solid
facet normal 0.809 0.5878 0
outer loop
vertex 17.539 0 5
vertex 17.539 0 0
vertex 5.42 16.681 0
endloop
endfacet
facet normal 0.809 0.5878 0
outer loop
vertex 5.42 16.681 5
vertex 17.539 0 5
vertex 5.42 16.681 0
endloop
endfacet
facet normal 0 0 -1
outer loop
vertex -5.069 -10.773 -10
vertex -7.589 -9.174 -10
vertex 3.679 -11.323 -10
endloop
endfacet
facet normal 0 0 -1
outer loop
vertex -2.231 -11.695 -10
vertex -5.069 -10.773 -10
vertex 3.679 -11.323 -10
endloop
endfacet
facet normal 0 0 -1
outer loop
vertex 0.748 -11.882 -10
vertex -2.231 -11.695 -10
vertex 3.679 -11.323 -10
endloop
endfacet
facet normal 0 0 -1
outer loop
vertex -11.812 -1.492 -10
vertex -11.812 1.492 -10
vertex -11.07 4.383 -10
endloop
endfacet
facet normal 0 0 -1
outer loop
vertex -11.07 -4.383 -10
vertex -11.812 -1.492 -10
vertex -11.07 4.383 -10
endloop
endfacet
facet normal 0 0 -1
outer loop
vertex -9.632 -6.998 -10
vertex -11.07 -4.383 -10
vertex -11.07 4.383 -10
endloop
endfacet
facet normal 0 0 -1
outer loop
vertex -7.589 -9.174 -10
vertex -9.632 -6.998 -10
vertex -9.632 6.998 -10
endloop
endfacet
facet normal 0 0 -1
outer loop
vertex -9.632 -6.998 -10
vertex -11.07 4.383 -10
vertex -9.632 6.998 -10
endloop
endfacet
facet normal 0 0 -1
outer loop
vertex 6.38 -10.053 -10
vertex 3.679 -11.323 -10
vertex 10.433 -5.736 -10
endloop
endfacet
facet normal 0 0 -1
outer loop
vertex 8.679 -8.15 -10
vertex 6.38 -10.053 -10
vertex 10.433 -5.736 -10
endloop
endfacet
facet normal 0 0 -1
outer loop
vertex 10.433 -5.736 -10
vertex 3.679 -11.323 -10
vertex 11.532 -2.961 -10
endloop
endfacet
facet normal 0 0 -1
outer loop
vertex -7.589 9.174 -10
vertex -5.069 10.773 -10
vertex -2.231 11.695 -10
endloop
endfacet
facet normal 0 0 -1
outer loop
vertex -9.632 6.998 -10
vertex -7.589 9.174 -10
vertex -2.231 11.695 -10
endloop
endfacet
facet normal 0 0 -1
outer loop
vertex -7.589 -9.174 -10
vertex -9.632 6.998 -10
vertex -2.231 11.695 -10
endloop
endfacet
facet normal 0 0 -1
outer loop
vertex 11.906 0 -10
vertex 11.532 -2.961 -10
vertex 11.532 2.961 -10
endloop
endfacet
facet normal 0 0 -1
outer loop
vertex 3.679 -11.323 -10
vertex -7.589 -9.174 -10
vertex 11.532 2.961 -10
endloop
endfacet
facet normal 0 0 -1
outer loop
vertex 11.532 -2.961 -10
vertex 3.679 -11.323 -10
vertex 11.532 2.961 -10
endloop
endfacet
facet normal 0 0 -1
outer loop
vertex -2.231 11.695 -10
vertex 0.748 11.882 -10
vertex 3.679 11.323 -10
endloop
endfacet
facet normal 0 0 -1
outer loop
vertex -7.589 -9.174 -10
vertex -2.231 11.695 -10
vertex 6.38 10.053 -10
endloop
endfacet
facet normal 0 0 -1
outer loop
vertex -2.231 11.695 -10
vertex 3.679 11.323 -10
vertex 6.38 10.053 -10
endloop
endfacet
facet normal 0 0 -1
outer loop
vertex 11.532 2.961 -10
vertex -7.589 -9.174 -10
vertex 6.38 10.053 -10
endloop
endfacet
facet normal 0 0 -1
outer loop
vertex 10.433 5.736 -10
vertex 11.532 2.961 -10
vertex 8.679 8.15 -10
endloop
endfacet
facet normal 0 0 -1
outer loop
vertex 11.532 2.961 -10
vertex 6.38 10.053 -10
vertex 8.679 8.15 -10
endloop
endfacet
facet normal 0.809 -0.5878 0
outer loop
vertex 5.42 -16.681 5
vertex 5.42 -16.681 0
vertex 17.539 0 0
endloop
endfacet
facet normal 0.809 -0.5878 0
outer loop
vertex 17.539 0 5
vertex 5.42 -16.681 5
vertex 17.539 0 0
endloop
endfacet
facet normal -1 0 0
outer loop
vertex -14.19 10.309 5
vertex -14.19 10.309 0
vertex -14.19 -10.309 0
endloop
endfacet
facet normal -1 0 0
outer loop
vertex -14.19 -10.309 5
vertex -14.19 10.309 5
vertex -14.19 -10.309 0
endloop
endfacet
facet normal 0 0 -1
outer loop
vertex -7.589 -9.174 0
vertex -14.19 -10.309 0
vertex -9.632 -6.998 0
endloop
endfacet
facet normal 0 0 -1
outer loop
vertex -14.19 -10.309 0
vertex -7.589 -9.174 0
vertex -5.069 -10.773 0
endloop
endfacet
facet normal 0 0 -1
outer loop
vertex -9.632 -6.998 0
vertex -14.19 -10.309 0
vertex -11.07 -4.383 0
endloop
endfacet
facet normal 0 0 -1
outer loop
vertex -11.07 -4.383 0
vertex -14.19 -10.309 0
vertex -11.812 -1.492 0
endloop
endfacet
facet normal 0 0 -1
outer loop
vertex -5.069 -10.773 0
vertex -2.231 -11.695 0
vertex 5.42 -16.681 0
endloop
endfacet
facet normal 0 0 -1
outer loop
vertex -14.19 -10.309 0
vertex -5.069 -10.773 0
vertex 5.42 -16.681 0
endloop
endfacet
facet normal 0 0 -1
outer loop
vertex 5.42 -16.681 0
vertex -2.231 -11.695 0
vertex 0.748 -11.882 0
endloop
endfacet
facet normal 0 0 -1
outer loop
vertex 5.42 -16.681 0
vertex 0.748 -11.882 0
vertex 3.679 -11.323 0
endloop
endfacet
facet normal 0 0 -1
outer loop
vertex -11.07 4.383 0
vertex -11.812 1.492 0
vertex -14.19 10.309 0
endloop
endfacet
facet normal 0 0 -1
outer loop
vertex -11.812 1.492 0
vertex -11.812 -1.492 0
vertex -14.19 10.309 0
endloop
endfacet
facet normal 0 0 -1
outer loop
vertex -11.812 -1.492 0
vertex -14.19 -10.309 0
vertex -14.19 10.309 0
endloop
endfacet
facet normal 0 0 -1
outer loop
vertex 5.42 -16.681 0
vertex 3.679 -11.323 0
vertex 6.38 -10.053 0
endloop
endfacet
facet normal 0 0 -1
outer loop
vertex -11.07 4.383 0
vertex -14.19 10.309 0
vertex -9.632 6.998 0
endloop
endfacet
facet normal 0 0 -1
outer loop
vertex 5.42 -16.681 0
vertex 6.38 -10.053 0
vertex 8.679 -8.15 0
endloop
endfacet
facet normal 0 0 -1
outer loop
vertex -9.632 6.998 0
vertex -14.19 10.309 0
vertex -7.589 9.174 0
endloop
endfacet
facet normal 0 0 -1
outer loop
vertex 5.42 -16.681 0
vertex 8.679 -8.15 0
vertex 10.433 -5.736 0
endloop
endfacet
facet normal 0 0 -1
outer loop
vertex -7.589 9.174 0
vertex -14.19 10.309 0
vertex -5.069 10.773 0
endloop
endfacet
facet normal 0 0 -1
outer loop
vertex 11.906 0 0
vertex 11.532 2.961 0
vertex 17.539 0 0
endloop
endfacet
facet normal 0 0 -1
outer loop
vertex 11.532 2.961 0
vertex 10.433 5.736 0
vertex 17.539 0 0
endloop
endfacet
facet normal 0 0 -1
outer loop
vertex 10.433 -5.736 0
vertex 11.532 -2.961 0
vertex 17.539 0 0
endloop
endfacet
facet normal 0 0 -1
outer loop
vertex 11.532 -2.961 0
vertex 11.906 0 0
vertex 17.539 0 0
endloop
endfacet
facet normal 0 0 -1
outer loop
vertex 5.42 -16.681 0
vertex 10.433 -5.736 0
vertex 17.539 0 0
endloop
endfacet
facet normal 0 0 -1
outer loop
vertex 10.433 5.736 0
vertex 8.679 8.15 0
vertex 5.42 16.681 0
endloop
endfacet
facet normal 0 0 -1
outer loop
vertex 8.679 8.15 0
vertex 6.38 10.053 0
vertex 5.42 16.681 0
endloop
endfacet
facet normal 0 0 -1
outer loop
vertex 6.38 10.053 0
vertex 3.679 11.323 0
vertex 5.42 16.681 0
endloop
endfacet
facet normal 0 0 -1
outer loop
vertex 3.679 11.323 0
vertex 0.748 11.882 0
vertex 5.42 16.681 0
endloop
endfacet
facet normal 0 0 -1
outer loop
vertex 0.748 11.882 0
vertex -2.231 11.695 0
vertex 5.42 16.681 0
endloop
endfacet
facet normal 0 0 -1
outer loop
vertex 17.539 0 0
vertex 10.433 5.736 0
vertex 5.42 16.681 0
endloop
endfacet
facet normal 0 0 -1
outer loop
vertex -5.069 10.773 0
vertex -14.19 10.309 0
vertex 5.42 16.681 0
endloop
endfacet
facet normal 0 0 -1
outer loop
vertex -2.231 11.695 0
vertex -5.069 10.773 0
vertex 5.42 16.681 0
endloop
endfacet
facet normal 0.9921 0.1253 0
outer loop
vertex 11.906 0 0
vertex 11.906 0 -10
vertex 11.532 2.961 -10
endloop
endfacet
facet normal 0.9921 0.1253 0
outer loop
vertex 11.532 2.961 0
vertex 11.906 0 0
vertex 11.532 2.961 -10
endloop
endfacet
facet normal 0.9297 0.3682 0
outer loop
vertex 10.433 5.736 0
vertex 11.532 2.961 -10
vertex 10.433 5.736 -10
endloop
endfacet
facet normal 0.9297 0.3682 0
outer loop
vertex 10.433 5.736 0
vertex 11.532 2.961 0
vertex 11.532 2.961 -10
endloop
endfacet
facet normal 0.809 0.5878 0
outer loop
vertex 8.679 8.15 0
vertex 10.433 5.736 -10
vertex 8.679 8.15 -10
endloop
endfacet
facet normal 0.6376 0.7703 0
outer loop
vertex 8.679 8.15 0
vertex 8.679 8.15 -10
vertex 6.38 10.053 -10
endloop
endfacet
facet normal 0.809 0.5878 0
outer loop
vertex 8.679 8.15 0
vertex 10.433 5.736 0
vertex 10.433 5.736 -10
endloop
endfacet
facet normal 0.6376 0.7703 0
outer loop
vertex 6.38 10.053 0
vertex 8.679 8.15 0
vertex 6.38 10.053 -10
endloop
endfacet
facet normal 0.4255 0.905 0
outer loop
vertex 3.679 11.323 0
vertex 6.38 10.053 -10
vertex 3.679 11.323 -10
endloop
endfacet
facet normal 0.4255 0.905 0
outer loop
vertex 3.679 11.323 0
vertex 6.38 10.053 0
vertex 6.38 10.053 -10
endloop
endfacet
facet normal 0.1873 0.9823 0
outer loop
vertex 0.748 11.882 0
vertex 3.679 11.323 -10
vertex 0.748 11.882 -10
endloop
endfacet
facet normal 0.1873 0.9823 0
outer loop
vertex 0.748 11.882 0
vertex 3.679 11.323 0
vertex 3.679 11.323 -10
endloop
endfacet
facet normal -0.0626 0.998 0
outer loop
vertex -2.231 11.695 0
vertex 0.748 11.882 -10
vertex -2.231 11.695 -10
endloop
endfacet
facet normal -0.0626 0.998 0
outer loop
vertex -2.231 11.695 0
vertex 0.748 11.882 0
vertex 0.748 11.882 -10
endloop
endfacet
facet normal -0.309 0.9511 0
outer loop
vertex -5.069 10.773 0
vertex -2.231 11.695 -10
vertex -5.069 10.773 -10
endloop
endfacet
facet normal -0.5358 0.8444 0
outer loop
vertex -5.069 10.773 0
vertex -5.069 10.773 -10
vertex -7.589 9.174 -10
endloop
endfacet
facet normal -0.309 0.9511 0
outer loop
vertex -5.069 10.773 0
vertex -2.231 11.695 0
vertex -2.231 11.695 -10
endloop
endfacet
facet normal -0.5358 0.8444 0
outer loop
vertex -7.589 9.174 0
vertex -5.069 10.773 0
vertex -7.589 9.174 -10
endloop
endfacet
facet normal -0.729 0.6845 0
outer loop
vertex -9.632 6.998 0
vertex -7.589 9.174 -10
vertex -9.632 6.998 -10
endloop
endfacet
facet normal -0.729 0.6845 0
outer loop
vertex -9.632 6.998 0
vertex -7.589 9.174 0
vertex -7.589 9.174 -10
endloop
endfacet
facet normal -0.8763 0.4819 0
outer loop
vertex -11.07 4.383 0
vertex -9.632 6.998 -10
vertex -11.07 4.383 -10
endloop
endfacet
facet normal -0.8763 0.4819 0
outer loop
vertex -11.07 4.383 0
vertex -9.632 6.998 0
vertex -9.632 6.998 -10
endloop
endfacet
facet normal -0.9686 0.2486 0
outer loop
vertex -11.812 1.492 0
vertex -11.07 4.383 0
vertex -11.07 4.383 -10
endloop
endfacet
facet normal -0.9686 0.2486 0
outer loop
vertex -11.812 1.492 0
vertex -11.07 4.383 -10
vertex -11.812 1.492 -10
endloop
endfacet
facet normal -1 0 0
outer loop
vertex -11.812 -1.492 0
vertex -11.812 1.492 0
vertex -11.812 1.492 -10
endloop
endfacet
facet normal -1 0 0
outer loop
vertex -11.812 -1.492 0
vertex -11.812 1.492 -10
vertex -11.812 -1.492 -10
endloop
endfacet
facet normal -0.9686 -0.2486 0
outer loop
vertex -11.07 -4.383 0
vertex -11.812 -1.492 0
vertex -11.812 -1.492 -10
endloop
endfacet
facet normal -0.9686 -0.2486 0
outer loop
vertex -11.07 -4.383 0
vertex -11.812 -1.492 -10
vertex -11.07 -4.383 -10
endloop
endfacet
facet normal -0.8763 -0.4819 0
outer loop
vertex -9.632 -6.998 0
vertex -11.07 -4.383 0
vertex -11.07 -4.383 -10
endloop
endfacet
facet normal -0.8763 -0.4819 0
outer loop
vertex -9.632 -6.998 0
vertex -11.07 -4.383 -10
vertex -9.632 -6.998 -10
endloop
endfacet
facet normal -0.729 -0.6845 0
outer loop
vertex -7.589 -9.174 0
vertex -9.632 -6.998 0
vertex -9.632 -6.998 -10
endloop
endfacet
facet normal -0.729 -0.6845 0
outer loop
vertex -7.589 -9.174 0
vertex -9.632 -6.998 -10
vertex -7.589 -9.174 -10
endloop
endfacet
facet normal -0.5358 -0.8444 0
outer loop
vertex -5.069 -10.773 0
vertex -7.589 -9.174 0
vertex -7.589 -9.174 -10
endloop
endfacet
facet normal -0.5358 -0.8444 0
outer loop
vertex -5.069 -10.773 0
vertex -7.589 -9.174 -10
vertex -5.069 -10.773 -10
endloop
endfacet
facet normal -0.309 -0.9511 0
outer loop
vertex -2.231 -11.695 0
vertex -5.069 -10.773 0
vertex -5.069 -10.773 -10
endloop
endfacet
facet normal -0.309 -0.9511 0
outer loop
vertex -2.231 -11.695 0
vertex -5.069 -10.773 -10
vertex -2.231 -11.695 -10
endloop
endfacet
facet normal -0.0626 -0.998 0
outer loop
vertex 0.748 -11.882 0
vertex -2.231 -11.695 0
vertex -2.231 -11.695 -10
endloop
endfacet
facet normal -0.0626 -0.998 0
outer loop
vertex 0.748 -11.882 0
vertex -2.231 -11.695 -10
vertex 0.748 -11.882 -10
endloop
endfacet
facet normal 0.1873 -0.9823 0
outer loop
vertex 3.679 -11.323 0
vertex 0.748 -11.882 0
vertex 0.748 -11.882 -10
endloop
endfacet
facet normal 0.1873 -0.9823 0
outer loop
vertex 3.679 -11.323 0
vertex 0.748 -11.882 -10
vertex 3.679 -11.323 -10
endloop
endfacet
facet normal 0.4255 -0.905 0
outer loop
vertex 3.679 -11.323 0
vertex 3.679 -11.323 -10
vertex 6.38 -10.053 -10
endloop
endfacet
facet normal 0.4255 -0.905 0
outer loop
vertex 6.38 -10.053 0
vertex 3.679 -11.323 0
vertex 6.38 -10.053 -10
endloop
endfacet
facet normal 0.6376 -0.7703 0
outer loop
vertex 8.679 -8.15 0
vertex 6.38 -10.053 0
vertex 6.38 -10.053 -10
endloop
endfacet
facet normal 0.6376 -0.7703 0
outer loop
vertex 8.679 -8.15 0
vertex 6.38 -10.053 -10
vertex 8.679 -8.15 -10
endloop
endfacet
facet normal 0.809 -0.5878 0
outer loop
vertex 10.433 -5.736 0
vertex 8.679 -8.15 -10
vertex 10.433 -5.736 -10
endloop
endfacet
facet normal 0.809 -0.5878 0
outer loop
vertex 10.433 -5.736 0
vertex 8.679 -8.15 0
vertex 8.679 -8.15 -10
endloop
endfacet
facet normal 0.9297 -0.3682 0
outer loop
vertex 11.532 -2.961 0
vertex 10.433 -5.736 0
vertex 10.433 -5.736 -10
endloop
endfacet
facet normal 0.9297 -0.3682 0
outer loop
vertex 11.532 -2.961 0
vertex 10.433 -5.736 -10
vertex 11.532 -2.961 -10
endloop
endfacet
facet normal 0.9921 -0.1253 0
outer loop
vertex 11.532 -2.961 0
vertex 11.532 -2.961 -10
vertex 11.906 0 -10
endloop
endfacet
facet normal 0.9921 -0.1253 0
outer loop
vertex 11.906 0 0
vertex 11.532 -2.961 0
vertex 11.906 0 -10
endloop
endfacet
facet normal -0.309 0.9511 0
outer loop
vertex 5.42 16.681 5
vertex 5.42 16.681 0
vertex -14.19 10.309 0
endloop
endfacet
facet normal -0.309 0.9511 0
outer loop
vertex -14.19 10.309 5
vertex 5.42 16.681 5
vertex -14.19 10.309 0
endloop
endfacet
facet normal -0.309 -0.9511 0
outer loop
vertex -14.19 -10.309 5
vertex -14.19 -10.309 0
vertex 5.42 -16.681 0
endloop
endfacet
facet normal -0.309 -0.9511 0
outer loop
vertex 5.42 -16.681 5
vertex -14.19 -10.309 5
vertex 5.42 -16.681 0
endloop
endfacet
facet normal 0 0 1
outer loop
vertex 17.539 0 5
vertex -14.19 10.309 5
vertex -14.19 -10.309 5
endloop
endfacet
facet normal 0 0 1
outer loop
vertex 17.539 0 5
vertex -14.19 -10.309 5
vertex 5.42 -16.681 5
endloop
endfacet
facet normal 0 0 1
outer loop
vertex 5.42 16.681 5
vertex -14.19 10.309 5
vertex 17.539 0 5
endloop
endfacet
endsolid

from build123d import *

# Parameters (mm, degrees)
F1_DEPTH = 5
F2_R     = 11.905945
F3_DEPTH = 15


with BuildPart() as f1:
    # F0 (on Top) → F1 (new body)
    with BuildSketch(Plane.XY):
        Polygon((17.539468, 0), (5.419994, 16.681025), (-14.189727, 10.30944), (-14.189727, -10.30944), (5.419994, -16.681025), align=None)
    extrude(amount=F1_DEPTH)

    # F2 (on face) → F3 (join)
    with BuildSketch(Plane.XY.offset(5)):
        Circle(F2_R)
    extrude(amount=-F3_DEPTH)


solid = f1.part
